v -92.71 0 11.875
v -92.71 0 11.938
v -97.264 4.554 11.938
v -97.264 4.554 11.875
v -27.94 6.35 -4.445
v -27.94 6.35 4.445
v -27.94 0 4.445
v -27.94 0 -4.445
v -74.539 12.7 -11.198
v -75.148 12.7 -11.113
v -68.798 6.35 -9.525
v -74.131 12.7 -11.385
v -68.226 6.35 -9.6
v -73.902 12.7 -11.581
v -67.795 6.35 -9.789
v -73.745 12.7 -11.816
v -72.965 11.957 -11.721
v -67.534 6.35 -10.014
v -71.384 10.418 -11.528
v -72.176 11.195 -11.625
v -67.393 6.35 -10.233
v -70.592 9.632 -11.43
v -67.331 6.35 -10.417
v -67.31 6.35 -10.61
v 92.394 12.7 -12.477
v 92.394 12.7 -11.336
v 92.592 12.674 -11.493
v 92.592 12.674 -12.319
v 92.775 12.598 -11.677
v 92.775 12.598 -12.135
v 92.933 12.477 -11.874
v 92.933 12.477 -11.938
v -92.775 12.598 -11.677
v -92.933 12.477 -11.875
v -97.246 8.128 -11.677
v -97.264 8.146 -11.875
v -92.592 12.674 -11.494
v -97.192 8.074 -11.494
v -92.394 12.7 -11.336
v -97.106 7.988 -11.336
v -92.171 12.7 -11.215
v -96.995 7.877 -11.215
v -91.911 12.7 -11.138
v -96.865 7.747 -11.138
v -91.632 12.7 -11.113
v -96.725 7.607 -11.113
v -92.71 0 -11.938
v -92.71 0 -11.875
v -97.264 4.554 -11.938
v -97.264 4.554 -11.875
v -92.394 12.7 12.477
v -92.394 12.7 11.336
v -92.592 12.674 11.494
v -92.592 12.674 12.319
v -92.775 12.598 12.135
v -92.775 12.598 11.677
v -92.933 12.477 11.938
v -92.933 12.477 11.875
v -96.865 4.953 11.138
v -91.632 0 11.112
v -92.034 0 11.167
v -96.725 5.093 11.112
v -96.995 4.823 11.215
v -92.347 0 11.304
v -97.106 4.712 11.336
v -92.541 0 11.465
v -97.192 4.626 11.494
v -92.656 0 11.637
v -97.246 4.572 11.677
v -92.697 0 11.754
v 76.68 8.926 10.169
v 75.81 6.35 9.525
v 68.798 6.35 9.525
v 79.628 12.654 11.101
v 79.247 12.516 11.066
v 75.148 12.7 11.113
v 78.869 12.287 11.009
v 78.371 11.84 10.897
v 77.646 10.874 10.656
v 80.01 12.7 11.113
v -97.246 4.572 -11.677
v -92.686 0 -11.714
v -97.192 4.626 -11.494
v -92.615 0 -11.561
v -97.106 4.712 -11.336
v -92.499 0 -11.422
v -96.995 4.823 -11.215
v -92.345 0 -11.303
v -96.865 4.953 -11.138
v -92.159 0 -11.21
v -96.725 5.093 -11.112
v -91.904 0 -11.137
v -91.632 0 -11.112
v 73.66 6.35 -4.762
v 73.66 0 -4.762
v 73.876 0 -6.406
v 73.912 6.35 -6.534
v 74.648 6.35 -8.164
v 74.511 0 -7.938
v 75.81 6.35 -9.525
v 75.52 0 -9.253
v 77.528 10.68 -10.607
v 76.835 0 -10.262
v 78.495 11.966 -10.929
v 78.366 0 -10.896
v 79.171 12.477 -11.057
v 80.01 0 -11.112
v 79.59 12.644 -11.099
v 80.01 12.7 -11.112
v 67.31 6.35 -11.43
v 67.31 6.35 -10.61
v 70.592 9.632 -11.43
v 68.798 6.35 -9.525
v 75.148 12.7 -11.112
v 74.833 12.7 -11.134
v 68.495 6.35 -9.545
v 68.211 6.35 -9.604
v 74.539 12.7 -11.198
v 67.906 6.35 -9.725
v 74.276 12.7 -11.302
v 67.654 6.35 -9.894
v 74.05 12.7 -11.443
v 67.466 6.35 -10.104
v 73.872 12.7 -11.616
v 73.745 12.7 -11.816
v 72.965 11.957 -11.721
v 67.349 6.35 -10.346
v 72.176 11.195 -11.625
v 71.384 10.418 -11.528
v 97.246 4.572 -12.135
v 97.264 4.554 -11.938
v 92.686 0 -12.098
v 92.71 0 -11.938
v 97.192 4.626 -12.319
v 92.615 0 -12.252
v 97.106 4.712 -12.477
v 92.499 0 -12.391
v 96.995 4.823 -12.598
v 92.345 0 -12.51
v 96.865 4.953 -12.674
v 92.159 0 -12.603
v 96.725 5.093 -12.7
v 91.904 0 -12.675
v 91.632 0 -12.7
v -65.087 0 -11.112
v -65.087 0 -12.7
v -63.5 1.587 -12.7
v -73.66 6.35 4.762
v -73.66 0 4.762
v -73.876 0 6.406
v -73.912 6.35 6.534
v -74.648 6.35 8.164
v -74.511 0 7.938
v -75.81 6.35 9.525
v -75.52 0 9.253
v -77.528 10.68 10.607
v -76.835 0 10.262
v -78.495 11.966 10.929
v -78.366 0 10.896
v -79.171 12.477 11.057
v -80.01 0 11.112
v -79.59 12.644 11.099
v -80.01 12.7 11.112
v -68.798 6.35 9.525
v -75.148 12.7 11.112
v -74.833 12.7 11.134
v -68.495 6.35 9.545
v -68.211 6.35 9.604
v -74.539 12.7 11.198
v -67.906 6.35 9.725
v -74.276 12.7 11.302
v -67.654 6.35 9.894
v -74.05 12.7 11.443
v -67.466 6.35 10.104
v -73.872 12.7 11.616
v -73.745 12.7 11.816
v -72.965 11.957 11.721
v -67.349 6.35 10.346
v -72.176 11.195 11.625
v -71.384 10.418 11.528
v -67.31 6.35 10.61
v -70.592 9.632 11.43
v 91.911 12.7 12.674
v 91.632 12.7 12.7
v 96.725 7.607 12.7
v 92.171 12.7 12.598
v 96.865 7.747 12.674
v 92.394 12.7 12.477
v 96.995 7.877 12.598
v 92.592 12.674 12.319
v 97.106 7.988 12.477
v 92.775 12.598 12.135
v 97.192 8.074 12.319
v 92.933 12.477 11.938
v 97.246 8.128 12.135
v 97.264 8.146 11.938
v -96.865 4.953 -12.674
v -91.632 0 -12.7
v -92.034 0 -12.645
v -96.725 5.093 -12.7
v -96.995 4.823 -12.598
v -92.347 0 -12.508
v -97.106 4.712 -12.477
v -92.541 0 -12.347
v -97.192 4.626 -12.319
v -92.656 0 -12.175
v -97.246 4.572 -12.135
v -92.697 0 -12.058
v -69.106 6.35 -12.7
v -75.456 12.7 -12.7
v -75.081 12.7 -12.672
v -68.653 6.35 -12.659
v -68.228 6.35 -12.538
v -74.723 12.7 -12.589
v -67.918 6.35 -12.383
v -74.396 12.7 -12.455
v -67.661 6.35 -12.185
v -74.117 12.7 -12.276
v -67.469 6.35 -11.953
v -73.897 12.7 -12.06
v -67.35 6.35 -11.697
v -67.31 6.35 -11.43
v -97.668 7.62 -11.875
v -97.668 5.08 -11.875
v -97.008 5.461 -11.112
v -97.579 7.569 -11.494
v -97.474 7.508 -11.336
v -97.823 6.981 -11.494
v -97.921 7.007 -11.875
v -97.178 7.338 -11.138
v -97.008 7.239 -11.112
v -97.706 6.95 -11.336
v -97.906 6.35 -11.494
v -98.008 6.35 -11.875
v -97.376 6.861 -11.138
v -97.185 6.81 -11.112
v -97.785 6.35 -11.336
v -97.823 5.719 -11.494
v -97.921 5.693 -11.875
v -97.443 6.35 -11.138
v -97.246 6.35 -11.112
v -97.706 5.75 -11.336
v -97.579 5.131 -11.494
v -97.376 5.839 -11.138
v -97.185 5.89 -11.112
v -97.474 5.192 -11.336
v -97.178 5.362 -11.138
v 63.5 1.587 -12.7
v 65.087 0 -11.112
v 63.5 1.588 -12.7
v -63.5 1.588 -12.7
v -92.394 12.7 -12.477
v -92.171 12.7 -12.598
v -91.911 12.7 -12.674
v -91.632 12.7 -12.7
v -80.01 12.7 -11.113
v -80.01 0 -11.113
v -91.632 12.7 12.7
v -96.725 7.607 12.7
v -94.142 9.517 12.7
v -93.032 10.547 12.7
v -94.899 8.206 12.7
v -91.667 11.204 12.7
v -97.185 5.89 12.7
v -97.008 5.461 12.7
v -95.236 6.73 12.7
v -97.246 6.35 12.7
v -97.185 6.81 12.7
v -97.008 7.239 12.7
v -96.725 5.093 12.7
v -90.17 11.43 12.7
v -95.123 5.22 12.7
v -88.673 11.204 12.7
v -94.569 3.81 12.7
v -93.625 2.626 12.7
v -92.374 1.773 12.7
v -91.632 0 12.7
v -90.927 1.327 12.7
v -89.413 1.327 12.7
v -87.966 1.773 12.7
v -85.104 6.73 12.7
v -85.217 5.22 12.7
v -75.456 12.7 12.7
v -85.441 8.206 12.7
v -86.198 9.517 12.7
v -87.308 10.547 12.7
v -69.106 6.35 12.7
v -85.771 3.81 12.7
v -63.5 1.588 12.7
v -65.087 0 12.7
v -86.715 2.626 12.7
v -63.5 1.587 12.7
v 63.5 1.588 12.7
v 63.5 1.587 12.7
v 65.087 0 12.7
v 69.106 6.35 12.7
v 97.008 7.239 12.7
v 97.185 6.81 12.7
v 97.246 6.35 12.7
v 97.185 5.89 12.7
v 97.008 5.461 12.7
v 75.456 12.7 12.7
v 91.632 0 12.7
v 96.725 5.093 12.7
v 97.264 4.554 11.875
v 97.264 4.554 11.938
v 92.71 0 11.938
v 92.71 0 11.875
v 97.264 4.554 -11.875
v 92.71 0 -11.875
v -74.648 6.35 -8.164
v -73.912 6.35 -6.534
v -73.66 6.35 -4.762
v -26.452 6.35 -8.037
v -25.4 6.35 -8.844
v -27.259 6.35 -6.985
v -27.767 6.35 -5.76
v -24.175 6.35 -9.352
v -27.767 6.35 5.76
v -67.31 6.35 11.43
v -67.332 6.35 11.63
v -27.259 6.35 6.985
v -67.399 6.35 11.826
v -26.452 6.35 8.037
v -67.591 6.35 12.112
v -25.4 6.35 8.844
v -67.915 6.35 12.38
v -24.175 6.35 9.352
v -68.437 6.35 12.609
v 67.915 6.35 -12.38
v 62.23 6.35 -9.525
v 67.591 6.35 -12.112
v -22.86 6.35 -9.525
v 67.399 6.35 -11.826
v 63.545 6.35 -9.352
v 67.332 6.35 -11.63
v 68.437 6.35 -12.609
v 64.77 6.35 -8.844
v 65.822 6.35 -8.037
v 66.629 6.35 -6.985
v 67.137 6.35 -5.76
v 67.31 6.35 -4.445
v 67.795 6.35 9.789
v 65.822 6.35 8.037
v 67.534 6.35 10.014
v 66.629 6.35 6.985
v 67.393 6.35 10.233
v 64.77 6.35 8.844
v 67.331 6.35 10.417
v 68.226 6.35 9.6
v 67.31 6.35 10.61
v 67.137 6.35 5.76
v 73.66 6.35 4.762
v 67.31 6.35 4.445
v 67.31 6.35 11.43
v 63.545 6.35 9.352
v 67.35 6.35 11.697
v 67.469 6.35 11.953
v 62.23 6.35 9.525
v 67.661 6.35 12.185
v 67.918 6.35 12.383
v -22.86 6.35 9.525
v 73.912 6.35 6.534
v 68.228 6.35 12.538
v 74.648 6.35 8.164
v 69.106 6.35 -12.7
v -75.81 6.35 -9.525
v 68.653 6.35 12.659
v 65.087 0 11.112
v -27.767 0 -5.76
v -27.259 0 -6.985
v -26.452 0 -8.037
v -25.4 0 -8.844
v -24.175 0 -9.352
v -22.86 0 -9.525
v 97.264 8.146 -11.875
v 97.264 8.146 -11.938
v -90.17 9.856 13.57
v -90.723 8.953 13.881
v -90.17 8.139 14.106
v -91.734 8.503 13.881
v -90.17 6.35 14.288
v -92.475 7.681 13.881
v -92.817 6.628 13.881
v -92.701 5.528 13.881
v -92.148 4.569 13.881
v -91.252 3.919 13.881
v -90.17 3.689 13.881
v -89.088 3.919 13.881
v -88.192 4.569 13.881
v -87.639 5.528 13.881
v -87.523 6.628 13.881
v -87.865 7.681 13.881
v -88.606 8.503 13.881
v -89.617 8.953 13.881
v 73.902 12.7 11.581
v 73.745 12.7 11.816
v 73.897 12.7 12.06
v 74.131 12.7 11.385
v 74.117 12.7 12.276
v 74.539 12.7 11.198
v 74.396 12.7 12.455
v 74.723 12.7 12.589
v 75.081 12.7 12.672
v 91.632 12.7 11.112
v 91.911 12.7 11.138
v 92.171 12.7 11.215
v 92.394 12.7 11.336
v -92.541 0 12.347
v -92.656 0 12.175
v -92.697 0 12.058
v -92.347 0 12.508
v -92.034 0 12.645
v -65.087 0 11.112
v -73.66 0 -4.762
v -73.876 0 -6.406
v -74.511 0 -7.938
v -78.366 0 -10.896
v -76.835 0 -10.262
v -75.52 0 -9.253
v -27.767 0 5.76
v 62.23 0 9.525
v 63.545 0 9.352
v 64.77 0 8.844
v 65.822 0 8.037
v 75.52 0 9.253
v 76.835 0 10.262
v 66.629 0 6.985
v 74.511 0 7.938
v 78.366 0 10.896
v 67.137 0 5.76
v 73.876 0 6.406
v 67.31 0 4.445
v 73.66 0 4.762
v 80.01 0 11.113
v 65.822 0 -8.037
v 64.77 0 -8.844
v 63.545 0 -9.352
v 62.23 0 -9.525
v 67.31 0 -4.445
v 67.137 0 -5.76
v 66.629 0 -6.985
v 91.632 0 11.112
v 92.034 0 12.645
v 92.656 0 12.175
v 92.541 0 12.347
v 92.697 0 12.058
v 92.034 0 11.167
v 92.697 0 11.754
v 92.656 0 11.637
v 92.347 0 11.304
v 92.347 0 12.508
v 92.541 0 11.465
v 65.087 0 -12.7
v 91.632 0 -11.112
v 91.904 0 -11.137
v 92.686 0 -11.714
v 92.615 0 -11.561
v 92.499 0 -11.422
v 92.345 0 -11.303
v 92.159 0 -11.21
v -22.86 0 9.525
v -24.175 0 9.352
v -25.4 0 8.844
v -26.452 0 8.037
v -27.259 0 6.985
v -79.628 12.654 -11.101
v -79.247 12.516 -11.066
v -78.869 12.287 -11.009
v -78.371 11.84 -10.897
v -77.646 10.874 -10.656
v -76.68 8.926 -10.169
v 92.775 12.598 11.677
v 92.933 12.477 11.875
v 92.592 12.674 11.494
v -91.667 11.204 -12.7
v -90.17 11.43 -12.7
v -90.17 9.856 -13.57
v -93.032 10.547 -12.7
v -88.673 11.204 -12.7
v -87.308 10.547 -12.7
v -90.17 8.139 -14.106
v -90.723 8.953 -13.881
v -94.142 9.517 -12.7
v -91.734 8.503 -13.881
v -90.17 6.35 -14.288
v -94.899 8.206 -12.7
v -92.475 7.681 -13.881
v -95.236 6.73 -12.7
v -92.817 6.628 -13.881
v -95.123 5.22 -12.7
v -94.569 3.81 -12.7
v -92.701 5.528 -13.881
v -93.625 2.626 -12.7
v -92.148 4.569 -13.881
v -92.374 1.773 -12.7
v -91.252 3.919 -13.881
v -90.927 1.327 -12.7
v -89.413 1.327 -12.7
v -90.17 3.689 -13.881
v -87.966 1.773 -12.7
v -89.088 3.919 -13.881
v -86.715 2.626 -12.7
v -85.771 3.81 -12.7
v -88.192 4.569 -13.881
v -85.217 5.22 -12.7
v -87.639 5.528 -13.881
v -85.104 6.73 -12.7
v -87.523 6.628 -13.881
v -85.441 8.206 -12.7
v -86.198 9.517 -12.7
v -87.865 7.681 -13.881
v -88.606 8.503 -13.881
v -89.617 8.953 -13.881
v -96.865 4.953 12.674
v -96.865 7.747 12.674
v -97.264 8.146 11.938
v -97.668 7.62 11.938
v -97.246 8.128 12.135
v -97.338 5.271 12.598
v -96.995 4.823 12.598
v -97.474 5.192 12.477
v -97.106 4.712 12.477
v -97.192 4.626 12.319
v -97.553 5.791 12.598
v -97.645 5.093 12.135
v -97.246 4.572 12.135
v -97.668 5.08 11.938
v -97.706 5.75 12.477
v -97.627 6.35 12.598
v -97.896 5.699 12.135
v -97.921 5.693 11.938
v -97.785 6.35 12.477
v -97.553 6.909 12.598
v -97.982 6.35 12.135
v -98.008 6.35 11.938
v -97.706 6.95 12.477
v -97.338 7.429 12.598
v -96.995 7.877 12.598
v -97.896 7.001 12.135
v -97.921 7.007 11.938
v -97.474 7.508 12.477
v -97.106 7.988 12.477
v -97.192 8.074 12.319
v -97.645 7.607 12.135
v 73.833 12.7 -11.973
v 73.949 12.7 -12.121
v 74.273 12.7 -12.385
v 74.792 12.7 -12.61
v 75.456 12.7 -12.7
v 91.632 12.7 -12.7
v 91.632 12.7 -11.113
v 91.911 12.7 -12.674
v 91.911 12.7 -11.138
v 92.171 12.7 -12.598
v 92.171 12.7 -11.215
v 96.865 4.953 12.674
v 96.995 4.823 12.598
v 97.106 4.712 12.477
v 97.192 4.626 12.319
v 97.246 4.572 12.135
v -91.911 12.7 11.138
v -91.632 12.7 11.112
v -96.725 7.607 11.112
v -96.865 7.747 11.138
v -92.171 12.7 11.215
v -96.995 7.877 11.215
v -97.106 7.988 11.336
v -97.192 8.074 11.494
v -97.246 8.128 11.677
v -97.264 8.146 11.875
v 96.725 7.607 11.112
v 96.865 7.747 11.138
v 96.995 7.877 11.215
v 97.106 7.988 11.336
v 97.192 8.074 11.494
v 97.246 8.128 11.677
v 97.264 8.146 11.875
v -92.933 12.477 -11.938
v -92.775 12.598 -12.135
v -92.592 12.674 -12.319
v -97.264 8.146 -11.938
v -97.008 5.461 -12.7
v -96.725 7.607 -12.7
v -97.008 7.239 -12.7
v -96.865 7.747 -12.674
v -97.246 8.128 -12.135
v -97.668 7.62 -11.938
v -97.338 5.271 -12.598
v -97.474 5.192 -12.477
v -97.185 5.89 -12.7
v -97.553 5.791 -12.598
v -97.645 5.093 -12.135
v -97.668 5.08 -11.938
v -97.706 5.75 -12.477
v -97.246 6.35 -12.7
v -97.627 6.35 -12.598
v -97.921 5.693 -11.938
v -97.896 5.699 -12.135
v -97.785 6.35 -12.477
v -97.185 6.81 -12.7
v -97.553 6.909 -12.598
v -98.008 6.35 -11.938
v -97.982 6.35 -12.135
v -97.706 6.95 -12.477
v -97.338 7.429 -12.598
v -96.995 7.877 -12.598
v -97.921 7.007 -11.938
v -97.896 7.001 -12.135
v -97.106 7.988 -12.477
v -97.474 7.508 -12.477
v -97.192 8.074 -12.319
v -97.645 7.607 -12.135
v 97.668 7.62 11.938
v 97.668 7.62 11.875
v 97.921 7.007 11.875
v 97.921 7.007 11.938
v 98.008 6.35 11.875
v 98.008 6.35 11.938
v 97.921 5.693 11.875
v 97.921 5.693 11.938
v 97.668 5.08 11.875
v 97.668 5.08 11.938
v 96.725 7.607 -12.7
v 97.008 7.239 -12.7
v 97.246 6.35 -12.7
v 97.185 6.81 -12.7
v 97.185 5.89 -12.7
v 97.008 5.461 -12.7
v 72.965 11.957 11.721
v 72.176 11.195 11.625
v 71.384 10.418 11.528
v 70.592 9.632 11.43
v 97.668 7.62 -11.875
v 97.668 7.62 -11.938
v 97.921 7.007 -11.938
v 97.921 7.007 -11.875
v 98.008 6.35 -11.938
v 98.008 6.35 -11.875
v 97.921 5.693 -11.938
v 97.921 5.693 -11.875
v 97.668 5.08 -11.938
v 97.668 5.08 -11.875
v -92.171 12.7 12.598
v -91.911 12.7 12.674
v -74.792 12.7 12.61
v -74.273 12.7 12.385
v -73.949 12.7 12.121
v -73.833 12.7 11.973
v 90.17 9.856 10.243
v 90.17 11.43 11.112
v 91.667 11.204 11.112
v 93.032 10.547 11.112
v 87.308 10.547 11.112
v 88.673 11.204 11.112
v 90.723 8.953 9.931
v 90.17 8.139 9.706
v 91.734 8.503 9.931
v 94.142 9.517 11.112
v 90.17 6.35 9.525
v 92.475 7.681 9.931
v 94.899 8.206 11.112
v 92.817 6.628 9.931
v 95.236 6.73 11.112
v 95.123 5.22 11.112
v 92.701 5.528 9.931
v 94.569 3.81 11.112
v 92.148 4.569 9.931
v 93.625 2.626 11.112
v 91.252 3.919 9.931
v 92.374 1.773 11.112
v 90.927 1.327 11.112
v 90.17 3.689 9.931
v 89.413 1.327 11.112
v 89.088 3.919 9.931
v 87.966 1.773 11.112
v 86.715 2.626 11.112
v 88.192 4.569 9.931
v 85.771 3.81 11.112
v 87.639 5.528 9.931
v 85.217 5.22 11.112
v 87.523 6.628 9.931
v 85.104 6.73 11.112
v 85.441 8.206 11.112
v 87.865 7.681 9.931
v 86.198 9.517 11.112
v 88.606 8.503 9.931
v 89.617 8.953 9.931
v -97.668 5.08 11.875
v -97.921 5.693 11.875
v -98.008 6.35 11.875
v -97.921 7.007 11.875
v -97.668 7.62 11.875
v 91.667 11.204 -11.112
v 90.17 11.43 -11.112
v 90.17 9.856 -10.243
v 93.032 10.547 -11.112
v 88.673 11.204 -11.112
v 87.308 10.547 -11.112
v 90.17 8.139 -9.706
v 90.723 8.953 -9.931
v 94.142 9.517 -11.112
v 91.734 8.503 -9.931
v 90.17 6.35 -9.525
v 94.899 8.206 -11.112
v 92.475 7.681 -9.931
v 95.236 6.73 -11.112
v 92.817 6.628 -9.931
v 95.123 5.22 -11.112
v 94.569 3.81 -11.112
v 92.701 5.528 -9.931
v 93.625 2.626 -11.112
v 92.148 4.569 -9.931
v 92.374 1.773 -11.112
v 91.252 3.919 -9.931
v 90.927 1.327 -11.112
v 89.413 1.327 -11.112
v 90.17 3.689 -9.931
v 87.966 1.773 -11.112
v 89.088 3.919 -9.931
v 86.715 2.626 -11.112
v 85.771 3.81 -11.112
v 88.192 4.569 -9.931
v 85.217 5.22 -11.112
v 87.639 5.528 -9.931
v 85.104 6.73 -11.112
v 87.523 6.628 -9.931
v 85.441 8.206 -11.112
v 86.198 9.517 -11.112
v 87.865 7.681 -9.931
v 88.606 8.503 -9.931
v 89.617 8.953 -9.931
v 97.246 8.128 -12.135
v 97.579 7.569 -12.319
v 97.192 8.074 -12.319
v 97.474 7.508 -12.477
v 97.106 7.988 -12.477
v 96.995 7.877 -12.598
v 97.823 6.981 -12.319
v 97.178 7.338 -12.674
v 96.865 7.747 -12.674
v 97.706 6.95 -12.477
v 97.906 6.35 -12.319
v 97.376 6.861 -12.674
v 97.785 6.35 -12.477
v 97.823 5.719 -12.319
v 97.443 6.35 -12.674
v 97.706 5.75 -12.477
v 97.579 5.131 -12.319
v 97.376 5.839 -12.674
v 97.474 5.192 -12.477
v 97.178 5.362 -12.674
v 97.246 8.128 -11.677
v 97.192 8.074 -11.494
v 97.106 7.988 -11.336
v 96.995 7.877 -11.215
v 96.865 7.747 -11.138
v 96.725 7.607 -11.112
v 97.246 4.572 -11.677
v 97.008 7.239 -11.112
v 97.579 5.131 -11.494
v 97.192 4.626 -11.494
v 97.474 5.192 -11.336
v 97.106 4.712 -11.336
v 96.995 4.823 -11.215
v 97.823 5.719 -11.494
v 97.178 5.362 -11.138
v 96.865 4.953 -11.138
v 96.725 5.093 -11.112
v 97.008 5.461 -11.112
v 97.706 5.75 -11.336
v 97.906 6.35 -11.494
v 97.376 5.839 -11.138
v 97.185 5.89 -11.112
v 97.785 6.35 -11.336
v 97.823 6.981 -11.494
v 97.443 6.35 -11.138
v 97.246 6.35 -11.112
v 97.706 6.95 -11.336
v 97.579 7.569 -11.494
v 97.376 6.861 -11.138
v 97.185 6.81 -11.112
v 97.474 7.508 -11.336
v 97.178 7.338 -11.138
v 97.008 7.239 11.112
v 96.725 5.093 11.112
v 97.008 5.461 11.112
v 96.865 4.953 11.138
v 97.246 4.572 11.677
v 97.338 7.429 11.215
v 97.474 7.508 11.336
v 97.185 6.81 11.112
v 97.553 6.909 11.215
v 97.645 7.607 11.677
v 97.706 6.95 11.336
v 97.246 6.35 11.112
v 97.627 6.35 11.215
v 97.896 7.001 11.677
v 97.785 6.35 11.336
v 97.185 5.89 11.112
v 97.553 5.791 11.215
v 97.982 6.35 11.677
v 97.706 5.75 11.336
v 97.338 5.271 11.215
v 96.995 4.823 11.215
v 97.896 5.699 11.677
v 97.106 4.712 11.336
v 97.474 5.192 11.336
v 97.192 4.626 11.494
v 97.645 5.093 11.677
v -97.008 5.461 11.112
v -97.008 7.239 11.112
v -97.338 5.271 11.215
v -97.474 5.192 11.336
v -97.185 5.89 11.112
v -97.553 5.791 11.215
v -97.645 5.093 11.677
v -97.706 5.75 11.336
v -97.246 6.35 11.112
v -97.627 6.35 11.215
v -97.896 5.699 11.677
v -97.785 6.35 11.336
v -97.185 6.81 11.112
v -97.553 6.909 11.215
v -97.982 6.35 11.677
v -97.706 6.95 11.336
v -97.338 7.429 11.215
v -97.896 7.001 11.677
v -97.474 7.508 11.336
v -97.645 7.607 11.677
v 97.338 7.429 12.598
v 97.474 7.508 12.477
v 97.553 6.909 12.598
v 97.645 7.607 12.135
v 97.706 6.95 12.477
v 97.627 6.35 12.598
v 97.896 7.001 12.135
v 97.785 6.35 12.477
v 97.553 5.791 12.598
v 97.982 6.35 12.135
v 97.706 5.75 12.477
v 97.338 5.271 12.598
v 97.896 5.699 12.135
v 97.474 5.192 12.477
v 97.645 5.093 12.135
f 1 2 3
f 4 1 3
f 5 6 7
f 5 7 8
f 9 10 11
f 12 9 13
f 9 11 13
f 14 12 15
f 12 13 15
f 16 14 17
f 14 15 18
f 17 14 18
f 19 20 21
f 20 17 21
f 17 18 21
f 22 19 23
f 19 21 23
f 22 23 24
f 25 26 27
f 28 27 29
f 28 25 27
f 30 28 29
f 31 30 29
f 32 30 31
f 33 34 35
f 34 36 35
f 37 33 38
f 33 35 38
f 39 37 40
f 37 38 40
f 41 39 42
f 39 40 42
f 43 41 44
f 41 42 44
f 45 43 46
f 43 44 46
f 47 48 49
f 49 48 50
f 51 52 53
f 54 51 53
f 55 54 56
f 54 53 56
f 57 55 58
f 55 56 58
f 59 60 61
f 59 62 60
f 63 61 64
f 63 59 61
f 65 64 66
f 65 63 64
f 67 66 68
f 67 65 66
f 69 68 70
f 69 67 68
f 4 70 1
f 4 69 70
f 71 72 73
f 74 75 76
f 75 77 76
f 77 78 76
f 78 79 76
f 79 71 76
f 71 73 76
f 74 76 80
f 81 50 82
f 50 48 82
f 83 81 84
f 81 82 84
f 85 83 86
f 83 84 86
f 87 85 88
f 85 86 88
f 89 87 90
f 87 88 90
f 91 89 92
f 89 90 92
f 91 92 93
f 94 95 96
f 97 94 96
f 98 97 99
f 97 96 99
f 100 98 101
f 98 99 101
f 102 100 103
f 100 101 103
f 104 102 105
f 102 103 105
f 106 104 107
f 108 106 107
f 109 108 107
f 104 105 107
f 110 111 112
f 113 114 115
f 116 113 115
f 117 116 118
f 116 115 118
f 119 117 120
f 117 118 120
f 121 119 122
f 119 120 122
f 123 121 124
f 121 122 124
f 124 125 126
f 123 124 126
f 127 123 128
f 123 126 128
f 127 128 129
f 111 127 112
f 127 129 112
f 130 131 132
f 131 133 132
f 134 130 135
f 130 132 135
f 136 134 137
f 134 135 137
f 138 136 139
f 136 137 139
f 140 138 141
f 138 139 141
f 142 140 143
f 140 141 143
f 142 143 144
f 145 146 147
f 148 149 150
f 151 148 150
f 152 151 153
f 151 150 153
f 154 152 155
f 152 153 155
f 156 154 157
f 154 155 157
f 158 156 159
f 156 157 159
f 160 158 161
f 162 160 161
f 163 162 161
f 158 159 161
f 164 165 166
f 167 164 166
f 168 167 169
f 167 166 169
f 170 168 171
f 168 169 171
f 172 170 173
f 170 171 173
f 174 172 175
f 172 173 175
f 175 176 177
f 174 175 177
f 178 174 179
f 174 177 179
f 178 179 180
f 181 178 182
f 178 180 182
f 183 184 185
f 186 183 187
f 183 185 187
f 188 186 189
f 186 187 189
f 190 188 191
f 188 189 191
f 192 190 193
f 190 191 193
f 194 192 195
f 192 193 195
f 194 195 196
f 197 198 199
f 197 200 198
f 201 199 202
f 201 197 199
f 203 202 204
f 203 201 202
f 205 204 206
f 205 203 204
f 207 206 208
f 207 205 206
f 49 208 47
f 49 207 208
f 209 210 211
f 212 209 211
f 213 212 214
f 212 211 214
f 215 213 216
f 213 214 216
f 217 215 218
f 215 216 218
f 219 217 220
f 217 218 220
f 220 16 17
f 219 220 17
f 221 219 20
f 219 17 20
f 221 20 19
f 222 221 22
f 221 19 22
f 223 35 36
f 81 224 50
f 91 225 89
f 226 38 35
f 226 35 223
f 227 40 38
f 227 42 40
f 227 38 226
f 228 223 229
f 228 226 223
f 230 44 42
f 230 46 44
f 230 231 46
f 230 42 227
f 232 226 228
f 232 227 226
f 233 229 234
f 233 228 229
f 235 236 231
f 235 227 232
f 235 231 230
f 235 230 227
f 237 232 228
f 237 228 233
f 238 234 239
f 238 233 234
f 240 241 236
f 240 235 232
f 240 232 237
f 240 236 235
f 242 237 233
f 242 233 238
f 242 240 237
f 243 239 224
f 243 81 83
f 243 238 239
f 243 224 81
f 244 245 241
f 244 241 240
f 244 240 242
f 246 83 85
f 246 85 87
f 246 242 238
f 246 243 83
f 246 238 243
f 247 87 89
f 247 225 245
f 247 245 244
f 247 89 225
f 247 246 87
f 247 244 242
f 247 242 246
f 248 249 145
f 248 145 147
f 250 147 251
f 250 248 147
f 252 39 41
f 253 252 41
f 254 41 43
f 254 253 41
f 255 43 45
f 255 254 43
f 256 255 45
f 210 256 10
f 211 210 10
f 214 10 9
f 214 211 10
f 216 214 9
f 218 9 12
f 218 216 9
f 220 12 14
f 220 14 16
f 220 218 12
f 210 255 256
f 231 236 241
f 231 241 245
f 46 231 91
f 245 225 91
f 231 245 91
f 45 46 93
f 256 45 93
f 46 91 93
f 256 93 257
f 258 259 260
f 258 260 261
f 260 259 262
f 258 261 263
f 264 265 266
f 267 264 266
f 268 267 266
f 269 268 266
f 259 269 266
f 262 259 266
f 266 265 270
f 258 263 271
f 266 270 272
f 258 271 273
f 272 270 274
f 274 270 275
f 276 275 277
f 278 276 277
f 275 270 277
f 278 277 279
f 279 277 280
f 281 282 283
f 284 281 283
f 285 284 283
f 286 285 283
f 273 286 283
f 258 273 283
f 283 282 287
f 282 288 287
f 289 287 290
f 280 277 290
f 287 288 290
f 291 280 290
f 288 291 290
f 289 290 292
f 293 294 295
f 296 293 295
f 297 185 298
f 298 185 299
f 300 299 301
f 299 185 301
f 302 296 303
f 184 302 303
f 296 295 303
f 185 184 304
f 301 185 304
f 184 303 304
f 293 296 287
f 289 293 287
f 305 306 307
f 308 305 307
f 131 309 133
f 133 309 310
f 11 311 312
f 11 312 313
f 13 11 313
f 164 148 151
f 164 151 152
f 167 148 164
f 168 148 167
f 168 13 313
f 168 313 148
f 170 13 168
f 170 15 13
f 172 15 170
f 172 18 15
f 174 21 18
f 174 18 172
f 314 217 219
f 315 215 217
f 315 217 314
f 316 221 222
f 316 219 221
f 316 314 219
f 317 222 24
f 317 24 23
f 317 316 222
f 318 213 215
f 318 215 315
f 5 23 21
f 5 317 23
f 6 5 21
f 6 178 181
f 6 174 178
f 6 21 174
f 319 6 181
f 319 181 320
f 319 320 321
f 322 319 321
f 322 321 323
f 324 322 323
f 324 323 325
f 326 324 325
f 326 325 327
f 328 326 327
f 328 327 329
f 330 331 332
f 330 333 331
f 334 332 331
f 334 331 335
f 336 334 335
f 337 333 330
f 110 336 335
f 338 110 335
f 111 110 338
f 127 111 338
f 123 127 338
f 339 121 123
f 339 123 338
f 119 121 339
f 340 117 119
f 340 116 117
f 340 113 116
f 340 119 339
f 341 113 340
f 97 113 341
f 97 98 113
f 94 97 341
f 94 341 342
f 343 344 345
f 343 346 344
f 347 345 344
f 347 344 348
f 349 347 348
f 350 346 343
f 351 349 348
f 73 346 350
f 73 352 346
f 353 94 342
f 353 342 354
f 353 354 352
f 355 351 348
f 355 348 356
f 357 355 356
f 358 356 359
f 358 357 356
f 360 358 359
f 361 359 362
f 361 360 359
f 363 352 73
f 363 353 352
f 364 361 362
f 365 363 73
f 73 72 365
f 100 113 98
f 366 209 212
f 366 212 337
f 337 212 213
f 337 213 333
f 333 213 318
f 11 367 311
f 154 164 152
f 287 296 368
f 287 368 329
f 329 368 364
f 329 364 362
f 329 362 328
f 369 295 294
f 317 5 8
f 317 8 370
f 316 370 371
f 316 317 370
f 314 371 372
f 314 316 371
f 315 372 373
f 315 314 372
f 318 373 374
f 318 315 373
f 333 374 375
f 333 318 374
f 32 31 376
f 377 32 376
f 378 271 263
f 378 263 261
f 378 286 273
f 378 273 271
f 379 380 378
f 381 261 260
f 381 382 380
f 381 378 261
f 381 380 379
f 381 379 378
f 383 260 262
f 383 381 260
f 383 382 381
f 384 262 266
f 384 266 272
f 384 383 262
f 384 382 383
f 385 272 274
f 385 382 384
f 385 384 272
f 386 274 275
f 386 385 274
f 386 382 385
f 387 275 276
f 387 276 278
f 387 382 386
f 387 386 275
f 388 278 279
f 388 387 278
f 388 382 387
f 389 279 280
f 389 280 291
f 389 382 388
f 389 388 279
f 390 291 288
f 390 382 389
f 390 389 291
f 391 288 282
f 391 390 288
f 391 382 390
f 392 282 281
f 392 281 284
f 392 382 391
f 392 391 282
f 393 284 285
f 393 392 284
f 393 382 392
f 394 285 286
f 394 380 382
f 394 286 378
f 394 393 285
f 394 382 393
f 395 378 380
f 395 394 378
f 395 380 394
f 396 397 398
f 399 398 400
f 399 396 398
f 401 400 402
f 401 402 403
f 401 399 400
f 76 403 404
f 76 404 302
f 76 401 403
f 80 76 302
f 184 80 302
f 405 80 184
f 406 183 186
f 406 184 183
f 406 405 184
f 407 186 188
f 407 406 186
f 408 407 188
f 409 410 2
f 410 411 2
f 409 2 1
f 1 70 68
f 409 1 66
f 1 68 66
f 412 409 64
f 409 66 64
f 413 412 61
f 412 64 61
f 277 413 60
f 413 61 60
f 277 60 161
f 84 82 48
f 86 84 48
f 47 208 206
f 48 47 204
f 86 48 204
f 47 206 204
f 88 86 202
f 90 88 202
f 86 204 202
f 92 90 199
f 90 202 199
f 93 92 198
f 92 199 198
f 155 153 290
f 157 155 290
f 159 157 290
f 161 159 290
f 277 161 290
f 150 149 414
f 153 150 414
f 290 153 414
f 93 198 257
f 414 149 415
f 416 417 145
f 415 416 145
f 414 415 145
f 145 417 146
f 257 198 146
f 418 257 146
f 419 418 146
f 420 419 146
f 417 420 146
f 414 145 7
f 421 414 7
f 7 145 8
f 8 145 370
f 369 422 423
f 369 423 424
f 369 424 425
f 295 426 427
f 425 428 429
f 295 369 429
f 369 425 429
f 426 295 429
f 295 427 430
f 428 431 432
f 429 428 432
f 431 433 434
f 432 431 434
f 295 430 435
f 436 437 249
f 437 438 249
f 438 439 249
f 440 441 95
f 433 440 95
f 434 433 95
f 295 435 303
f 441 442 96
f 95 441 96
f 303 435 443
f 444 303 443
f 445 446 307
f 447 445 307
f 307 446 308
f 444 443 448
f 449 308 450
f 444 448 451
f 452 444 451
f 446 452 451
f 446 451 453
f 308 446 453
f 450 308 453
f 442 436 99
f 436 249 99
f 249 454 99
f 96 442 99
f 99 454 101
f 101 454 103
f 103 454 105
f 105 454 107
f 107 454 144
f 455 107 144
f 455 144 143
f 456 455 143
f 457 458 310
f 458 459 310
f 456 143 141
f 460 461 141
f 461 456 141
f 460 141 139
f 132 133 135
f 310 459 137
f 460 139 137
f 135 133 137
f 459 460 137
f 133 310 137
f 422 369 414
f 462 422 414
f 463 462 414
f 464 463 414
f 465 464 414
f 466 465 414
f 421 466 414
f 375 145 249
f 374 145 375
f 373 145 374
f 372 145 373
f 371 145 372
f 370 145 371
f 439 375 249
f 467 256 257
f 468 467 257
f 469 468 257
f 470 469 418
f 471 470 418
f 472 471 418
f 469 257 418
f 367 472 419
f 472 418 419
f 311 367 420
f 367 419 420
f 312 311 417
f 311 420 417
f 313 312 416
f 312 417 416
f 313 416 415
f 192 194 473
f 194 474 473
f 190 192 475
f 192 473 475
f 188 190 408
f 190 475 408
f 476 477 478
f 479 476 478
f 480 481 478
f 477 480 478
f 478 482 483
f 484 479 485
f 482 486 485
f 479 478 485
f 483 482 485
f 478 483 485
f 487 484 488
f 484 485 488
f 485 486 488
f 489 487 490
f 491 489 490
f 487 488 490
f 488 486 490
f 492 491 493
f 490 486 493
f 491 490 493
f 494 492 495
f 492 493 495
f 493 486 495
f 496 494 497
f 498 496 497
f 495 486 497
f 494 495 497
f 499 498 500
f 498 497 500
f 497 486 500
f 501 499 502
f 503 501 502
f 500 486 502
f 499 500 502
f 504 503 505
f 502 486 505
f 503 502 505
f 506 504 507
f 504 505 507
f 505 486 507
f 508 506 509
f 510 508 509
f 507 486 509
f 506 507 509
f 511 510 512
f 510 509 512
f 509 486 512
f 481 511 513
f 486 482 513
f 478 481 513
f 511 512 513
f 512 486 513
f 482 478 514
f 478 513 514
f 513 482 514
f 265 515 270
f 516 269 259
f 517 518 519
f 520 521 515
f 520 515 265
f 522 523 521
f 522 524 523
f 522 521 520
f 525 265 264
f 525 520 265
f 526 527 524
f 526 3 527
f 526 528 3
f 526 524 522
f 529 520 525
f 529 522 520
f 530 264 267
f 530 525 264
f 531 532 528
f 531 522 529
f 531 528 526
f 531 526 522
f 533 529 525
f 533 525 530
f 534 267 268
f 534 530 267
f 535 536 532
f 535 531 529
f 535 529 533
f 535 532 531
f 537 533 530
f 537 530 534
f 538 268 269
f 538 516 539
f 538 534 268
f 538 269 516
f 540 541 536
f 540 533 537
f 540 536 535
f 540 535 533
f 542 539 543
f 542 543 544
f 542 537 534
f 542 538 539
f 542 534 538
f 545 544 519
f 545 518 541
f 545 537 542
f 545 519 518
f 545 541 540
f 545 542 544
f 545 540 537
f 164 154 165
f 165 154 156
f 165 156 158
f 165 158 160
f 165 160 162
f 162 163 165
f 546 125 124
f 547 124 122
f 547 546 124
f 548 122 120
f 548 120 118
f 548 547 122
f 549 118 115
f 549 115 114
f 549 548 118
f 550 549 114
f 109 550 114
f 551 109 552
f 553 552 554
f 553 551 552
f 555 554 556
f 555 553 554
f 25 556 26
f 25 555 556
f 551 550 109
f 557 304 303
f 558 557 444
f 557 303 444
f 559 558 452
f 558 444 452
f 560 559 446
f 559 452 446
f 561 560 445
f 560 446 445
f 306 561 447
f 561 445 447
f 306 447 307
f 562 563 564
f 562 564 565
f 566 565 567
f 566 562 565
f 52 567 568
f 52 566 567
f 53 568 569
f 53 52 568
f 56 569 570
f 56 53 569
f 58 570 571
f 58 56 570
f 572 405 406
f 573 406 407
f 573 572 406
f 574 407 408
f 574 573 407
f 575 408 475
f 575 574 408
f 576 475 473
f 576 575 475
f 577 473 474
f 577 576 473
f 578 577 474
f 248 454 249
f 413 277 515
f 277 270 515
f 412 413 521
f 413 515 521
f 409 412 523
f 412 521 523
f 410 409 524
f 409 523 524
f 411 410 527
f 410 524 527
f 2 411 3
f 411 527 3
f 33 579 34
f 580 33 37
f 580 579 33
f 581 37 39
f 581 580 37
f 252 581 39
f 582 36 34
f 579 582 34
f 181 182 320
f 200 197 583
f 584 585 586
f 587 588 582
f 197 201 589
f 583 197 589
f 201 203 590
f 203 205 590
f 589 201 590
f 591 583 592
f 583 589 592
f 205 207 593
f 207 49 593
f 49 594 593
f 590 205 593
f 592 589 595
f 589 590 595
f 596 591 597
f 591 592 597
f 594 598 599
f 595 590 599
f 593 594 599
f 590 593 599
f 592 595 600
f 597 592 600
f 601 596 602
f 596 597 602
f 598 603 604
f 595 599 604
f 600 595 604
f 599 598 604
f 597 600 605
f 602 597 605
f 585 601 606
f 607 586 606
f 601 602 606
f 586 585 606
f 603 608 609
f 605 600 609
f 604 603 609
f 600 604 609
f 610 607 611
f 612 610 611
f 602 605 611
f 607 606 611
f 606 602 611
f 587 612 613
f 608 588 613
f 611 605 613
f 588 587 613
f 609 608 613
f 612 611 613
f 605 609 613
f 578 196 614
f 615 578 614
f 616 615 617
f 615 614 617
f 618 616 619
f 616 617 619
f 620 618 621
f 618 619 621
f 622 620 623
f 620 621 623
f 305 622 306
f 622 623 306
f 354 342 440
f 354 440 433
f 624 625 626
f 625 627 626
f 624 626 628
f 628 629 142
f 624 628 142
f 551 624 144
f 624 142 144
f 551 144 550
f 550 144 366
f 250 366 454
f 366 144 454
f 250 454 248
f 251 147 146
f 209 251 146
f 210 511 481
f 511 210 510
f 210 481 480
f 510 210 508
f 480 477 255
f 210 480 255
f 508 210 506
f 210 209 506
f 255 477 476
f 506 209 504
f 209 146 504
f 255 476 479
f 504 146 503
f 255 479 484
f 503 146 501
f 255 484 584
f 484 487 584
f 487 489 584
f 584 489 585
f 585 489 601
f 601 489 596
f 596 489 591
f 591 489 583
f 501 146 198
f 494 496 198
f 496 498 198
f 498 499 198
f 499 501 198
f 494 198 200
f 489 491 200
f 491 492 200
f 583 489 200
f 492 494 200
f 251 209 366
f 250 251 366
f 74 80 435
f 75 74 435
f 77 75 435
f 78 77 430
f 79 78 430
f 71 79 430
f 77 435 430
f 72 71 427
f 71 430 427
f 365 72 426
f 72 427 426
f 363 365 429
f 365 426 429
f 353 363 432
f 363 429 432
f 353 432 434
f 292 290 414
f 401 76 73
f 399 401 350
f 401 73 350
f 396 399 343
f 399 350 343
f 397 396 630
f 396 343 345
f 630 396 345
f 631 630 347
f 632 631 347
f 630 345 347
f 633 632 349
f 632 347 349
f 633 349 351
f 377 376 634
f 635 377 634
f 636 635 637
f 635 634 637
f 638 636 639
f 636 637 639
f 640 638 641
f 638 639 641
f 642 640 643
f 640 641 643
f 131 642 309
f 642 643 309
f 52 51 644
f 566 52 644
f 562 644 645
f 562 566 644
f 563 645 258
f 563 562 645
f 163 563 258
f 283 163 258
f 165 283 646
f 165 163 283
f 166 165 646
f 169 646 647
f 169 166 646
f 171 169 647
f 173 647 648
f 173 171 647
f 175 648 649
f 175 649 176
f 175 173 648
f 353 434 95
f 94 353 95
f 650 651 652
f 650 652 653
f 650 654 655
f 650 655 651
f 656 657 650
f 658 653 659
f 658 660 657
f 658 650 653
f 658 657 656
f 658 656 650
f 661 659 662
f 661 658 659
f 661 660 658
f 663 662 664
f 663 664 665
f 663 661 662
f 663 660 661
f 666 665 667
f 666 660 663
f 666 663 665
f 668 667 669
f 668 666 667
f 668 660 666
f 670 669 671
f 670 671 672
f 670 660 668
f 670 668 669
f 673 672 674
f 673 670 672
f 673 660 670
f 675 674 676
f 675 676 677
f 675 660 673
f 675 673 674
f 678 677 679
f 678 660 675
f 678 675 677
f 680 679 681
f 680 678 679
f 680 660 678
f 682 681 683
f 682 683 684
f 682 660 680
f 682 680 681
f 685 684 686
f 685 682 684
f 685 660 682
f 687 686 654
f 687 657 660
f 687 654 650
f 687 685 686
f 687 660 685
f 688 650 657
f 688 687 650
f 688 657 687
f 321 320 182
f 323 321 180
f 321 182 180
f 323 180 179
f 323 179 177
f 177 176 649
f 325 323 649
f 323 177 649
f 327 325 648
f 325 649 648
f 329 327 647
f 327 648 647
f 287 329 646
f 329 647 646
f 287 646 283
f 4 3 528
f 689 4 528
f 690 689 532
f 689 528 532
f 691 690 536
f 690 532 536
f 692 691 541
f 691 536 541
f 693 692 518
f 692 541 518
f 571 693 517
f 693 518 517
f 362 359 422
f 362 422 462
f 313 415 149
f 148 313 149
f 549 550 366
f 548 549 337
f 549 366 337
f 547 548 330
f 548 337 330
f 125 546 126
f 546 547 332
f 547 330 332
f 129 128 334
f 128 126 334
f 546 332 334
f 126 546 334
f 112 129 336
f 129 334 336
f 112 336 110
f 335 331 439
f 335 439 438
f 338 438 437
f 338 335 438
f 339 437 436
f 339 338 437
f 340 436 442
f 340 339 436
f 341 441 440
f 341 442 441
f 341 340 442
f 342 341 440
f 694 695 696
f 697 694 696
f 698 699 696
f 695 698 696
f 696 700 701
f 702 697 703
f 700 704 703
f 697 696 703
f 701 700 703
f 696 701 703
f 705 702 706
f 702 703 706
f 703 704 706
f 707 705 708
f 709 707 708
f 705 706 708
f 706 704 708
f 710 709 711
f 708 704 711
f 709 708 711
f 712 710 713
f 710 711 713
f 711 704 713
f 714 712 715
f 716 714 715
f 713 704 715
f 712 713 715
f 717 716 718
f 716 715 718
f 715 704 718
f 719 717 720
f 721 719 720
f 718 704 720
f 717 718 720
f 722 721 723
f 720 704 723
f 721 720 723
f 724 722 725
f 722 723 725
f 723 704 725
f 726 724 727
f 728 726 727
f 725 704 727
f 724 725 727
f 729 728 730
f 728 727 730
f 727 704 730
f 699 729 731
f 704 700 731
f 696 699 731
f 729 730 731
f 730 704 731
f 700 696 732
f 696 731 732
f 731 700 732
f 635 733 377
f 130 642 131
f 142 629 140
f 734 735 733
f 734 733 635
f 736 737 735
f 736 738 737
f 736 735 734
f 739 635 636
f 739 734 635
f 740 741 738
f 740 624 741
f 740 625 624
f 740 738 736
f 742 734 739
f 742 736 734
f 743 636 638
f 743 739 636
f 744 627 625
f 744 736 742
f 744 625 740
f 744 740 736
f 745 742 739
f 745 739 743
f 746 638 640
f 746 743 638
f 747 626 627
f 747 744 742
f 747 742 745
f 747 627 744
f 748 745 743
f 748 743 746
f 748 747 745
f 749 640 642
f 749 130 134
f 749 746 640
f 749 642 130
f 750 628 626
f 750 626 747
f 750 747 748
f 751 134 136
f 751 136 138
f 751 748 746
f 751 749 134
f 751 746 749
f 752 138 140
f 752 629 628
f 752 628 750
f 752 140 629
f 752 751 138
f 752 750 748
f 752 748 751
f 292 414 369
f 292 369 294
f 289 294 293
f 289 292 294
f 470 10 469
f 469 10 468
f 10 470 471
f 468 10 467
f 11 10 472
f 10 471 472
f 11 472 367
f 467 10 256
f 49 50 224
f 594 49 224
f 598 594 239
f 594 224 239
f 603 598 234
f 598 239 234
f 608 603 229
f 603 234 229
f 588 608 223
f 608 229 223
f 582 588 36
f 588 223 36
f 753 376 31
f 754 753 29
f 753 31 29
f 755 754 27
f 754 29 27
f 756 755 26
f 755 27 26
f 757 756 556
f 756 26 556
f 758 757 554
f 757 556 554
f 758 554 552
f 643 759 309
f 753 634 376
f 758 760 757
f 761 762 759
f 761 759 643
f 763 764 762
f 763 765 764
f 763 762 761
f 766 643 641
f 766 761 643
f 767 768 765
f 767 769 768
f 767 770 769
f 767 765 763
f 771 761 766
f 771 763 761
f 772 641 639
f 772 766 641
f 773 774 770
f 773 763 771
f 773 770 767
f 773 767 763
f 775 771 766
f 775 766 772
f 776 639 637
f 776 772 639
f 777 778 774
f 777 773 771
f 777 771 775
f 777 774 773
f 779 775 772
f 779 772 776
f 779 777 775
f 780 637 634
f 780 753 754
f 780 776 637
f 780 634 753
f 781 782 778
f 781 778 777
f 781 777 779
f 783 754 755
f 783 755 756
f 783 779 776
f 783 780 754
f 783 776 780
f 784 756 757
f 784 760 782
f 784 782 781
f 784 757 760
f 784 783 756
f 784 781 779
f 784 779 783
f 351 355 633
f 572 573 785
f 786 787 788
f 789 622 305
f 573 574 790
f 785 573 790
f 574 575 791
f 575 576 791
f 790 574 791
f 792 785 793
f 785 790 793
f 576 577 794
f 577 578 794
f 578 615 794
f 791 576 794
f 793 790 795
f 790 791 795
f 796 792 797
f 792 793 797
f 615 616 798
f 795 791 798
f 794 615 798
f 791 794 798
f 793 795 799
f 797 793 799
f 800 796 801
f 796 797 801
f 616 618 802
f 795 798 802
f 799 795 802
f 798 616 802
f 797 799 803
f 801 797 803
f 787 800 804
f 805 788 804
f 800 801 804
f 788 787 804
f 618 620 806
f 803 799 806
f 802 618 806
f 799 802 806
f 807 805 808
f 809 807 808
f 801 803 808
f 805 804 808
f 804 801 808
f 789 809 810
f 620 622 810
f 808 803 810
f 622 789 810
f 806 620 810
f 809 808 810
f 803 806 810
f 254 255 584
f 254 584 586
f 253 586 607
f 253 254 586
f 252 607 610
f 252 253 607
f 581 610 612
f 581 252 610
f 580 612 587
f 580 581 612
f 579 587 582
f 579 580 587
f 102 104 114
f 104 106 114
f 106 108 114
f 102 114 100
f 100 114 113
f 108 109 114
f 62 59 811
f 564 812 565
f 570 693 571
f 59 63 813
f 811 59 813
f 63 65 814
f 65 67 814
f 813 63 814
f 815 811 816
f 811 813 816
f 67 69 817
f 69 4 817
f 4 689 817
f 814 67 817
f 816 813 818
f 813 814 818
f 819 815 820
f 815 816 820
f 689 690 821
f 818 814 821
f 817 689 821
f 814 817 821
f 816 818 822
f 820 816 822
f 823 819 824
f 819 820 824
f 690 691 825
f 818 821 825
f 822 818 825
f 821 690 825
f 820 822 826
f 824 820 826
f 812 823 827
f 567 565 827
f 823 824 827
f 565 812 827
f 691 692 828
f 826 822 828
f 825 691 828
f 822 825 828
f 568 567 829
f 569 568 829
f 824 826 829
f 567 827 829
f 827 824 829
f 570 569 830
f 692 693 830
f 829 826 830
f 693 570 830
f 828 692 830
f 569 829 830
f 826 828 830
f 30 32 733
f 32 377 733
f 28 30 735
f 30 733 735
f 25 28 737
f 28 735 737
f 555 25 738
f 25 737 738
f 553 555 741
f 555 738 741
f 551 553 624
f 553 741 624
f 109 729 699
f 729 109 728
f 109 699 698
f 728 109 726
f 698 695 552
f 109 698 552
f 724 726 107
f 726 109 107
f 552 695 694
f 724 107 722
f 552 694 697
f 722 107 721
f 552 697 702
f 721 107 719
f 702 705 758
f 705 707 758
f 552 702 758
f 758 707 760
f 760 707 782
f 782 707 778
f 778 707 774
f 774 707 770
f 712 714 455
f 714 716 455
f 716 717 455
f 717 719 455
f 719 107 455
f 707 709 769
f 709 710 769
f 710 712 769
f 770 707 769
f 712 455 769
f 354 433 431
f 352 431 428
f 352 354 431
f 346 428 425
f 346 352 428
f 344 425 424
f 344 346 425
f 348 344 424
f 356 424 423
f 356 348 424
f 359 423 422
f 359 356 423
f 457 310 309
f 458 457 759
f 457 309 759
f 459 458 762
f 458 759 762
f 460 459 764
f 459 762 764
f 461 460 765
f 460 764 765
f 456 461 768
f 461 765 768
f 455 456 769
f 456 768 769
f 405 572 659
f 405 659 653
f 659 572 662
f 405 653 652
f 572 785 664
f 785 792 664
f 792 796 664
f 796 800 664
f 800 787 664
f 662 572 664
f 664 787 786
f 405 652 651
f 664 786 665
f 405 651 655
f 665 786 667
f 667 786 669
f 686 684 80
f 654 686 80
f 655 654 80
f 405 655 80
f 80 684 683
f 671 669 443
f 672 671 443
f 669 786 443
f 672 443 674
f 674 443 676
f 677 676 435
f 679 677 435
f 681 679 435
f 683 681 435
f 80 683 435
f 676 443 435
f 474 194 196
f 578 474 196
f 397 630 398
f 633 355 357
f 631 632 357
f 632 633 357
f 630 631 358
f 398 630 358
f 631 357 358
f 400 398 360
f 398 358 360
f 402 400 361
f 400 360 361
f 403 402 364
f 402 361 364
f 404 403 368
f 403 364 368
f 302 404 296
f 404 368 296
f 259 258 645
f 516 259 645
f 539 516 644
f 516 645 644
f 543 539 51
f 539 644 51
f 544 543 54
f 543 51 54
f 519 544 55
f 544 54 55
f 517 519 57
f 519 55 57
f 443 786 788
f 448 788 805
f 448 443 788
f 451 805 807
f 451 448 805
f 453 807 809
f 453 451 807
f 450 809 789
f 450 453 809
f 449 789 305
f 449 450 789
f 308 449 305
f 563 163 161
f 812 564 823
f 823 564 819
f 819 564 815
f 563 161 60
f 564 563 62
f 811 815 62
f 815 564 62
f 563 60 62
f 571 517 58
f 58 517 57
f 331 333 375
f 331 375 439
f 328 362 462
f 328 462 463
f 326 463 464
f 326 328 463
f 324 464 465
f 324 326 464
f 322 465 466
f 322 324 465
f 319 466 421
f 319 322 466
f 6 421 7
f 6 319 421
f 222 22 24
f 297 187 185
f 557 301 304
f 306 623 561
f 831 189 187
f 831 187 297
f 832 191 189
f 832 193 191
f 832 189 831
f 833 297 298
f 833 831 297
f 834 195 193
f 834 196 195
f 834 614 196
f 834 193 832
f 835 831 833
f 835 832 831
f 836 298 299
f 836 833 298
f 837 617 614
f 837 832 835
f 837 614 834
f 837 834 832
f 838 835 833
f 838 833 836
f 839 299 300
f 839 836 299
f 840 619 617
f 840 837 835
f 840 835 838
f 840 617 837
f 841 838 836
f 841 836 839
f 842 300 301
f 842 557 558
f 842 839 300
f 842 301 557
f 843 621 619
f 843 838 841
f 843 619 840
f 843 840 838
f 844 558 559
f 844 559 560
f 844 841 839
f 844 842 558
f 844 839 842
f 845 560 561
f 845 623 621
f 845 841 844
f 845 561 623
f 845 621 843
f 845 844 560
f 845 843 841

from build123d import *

# Parameters (mm, degrees)
BOSS_EXTRUDE1_DEPTH = 12.7
CUT_EXTRUDE2_DEPTH  = 199.932436772
CUT_EXTRUDE1_DEPTH  = 104.050150898
CUT_EXTRUDE3_DEPTH  = 63.5
CHAMFER1_SIZE       = 1.5875
FILLET1_R           = 0.762
FILLET2_R           = 1.27
CUT_EXTRUDE4_DEPTH  = 100.247182118


# Some blends are built 0.0001 mm under size
with BuildPart() as part:
    # Sketch1 → Boss-Extrude1 (new body)
    with BuildSketch(Plane(origin=(0, 0, 0), x_dir=(1, 0, 0), z_dir=(0, 1, 0))):
        with BuildLine():
            Line((-99.06, -12.7), (99.06, -12.7))
            Line((99.06, -12.7), (99.06, -11.1125))
            Line((99.06, -11.1125), (80.01, -11.1125))
            ThreePointArc((80.01, -11.1125), (75.519871939, -9.252628061), (73.66, -4.7625))
            Line((73.66, -4.7625), (73.66, 4.7625))
            ThreePointArc((73.66, 4.7625), (75.519871939, 9.252628061), (80.01, 11.1125))
            Line((80.01, 11.1125), (99.06, 11.1125))
            Line((99.06, 11.1125), (99.06, 12.7))
            Line((99.06, 12.7), (-99.06, 12.7))
            Line((-99.06, 12.7), (-99.06, 11.1125))
            Line((-99.06, 11.1125), (-80.01, 11.1125))
            ThreePointArc((-80.01, 11.1125), (-75.519871939, 9.252628061), (-73.66, 4.7625))
            Line((-73.66, 4.7625), (-73.66, -4.7625))
            ThreePointArc((-73.66, -4.7625), (-75.519871939, -9.252628061), (-80.01, -11.1125))
            Line((-80.01, -11.1125), (-99.06, -11.1125))
            Line((-99.06, -11.1125), (-99.06, -12.7))
        make_face()
    extrude(amount=BOSS_EXTRUDE1_DEPTH)

    # Sketch3 → Cut-Extrude2 (cut, through all)
    with BuildSketch(Plane.ZY.offset(99.06)):
        Polygon((11.1125, 12.7), (4.7625, 12.7), (-4.7625, 12.7), (-11.1125, 12.7), (-9.525, 6.35), (9.525, 6.35), align=None)
    extrude(amount=-CUT_EXTRUDE2_DEPTH, mode=Mode.SUBTRACT)

    # Sketch2 → Cut-Extrude1 (cut, through all)
    with BuildSketch(Plane.XY.offset(12.7)):
        Polygon((73.66, 12.7), (-73.66, 12.7), (-67.31, 6.35), (67.31, 6.35), align=None)
        with BuildLine():
            Line((97.263948776, 4.553948776), (92.71, 0))
            Line((92.71, 0), (99.06, 0))
            Line((99.06, 0), (99.06, 12.7))
            Line((99.06, 12.7), (92.71, 12.7))
            Line((92.71, 12.7), (97.263948776, 8.146051224))
            ThreePointArc((97.263948776, 8.146051224), (98.007897552, 6.35), (97.263948776, 4.553948776))
        make_face()
        with BuildLine():
            ThreePointArc((-97.263948776, 4.553948776), (-98.007897552, 6.35), (-97.263948776, 8.146051224))
            Line((-97.263948776, 8.146051224), (-92.71, 12.7))
            Line((-92.71, 12.7), (-99.06, 12.7))
            Line((-99.06, 12.7), (-99.06, 0))
            Line((-99.06, 0), (-92.71, 0))
            Line((-92.71, 0), (-97.263948776, 4.553948776))
        make_face()
    extrude(amount=-CUT_EXTRUDE1_DEPTH, mode=Mode.SUBTRACT)

    # Sketch4 → Revolve1 (revolve)
    with BuildSketch(Plane.ZY.offset(90.17)):
        with BuildLine():
            Line((12.7, 6.35), (12.7, 11.43))
            ThreePointArc((12.7, 11.43), (13.881381744, 9.01113492), (14.2875, 6.35))
            Line((14.2875, 6.35), (12.7, 6.35))
        make_face()
    revolve1 = revolve(axis=Axis((-90.17, 6.35, 0), (0, 0, 1)))

    # Mirror1: Revolve1 across plane
    add(revolve1.mirror(Plane.XY))

    # Sketch5 → Revolve2 (revolve)
    with BuildSketch(Plane(origin=(90.17, 0, 0), x_dir=(0, 0, -1), z_dir=(1, 0, 0))):
        with BuildLine():
            Line((11.1125, 6.35), (11.1125, 11.43))
            ThreePointArc((11.1125, 11.43), (9.931118256, 9.01113492), (9.525, 6.35))
            Line((9.525, 6.35), (11.1125, 6.35))
        make_face()
    revolve2 = revolve(axis=Axis((90.17, 6.35, 0), (0, 0, -1)))

    # Mirror2: Revolve2 across plane
    add(revolve2.mirror(Plane.XY))

    # Sketch6 → Cut-Extrude3 (cut, symmetric)
    with BuildSketch(Plane(origin=(0, 0, 0), x_dir=(0, 0, -1), z_dir=(1, 0, 0))):
        Polygon((-12.7, 0), (-11.1125, 0), (-12.7, 1.5875), align=None)
        Polygon((11.1125, 0), (12.7, 1.5875), (12.7, 0), align=None)
    extrude(amount=CUT_EXTRUDE3_DEPTH, both=True, mode=Mode.SUBTRACT)

    # Chamfer1
    chamfer1_edges = [part.edges().sort_by_distance(p)[0] for p in [
        (63.5, 0, 11.90625),
        (63.5, 0, -11.90625),
        (-63.5, 0, -11.90625),
        (-63.5, 0, 11.90625),
    ]]
    chamfer(chamfer1_edges, length=CHAMFER1_SIZE - 0.0001)  # a hair under: the kernel refuses the full size

    # Fillet1
    fillet1_edges = [part.edges().sort_by_distance(p)[0] for p in [
        (-98.007897552, 6.35, 12.7),
        (-92.71, 12.7, -11.90625),
        (-94.986974388, 10.423025612, -11.1125),
        (-94.986974388, 10.423025612, -12.7),
        (-94.986974388, 10.423025612, 11.1125),
        (-92.71, 12.7, 11.90625),
        (-94.986974388, 2.276974388, 12.7),
        (-98.007897552, 6.35, -11.1125),
        (-98.007897552, 6.35, 11.1125),
        (-94.986974388, 2.276974388, -11.1125),
        (-94.986974388, 2.276974388, 11.1125),
        (-98.007897552, 6.35, -12.7),
        (-94.986974388, 2.276974388, -12.7),
        (-94.986974388, 10.423025612, 12.7),
        (98.007897552, 6.35, 12.7),
        (92.71, 12.7, 11.90625),
        (92.71, 12.7, -11.90625),
        (94.986974388, 10.423025612, 12.7),
        (94.986974388, 2.276974388, 11.1125),
        (94.986974388, 2.276974388, -11.1125),
        (94.986974388, 2.276974388, -12.7),
        (98.007897552, 6.35, 11.1125),
        (94.986974388, 10.423025612, 11.1125),
        (94.986974388, 10.423025612, -11.1125),
        (98.007897552, 6.35, -12.7),
        (94.986974388, 10.423025612, -12.7),
        (94.986974388, 2.276974388, 12.7),
        (98.007897552, 6.35, -11.1125),
    ]]
    fillet(fillet1_edges, radius=FILLET1_R)

    # Fillet2
    # the kernel refuses this fillet: 1.27 mm, written as the material it takes off along each edge
    with BuildSketch(Plane(origin=(-75.90506403, 14.94506403, -12.7), x_dir=(-0.7071067811865446, -0.7071067811865505, 0), z_dir=(0.7071067811865506, -0.7071067811865446, 0))) as fillet2_piece_1_section:
        with BuildLine():
            CenterArc((FILLET2_R, -FILLET2_R), FILLET2_R, 90, 90)
            Line((0, -FILLET2_R), (0, 0))
            Line((0, 0), (FILLET2_R, 0))
        make_face()
    fillet2_piece_1 = extrude(amount=15.330256121, mode=Mode.PRIVATE)
    fillet2_piece_1 = split(fillet2_piece_1, bisect_by=Plane(origin=(-71.905795305, 6.35, -12.408746665), z_dir=(0, 1, 0)), keep=Keep.TOP, mode=Mode.PRIVATE)
    add(fillet2_piece_1, mode=Mode.SUBTRACT)
    with BuildSketch(Plane(origin=(-65.450815483, 4.490815483, -9.060203871), x_dir=(0.1230914909792504, -0.12309149097924957, -0.9847319278346824), z_dir=(-0.696310623822809, 0.6963106238228031, -0.17407765595558086))) as fillet2_piece_2_section:
        with BuildLine():
            CenterArc((FILLET2_R * 0.840960781889, FILLET2_R), FILLET2_R, 189.874961398, 80.125038602)
            Line((-FILLET2_R * 0.144223584254, FILLET2_R * 0.828501414858), (0, 0))
            Line((0, 0), (FILLET2_R * 0.840960781889, 0))
        make_face()
    fillet2_piece_2 = extrude(amount=14.459594166, mode=Mode.PRIVATE)
    fillet2_piece_2 = split(fillet2_piece_2, bisect_by=Plane(origin=(-71.646234354, 6.35, -10.770930609), z_dir=(0, 1, 0)), keep=Keep.TOP, mode=Mode.PRIVATE)
    add(fillet2_piece_2, mode=Mode.SUBTRACT)
    with BuildSketch(Plane(origin=(-75.519184517, 14.559184517, 11.577296129), x_dir=(-0.7177405625652845, -0.6755205294731655, -0.1688801323683837), z_dir=(0.69631062382278, -0.6963106238227741, -0.17407765595581334))) as fillet2_piece_3_section:
        with BuildLine():
            CenterArc((FILLET2_R * 0.840960781889, -FILLET2_R), FILLET2_R, 90, 80.125038602)
            Line((-FILLET2_R * 0.144223584254, -FILLET2_R * 0.828501414857), (0, 0))
            Line((0, 0), (FILLET2_R * 0.840960781889, 0))
        make_face()
    fillet2_piece_3 = extrude(amount=14.459594166, mode=Mode.PRIVATE)
    fillet2_piece_3 = split(fillet2_piece_3, bisect_by=Plane(origin=(-71.646234354, 6.35, 10.770930609), z_dir=(0, 1, 0)), keep=Keep.TOP, mode=Mode.PRIVATE)
    add(fillet2_piece_3, mode=Mode.SUBTRACT)
    with BuildSketch(Plane(origin=(-75.90506403, 14.94506403, 12.7), x_dir=(-0.7071067811865445, -0.7071067811865505, 0), z_dir=(0.7071067811865506, -0.7071067811865446, 0))) as fillet2_piece_4_section:
        with BuildLine():
            CenterArc((FILLET2_R, FILLET2_R), FILLET2_R, 180, 90)
            Line((0, FILLET2_R), (0, 0))
            Line((0, 0), (FILLET2_R, 0))
        make_face()
    fillet2_piece_4 = extrude(amount=15.330256121, mode=Mode.PRIVATE)
    fillet2_piece_4 = split(fillet2_piece_4, bisect_by=Plane(origin=(-71.905795305, 6.35, 12.408746665), z_dir=(0, 1, 0)), keep=Keep.TOP, mode=Mode.PRIVATE)
    add(fillet2_piece_4, mode=Mode.SUBTRACT)
    with BuildSketch(Plane(origin=(65.06493597, 4.10493597, -12.7), x_dir=(0.7071067811865445, -0.7071067811865506, 0), z_dir=(0.7071067811865506, 0.7071067811865445, 0))) as fillet2_piece_5_section:
        with BuildLine():
            CenterArc((FILLET2_R, -FILLET2_R), FILLET2_R, 90, 90)
            Line((0, -FILLET2_R), (0, 0))
            Line((0, 0), (FILLET2_R, 0))
        make_face()
    fillet2_piece_5 = extrude(amount=15.330256121, mode=Mode.PRIVATE)
    fillet2_piece_5 = split(fillet2_piece_5, bisect_by=Plane(origin=(71.905795305, 6.35, -12.408746665), z_dir=(0, 1, 0)), keep=Keep.TOP, mode=Mode.PRIVATE)
    add(fillet2_piece_5, mode=Mode.SUBTRACT)
    with BuildSketch(Plane(origin=(75.519184517, 14.559184517, -11.577296129), x_dir=(-0.12309149097927001, -0.12309149097926336, -0.9847319278346782), z_dir=(-0.6963106238228061, -0.6963106238228001, 0.17407765595560445))) as fillet2_piece_6_section:
        with BuildLine():
            CenterArc((FILLET2_R * 0.840960781889, FILLET2_R), FILLET2_R, 189.874961398, 80.125038602)
            Line((-FILLET2_R * 0.144223584254, FILLET2_R * 0.828501414858), (0, 0))
            Line((0, 0), (FILLET2_R * 0.84096078189, 0))
        make_face()
    fillet2_piece_6 = extrude(amount=14.459594166, mode=Mode.PRIVATE)
    fillet2_piece_6 = split(fillet2_piece_6, bisect_by=Plane(origin=(71.646234354, 6.35, -10.770930609), z_dir=(0, 1, 0)), keep=Keep.TOP, mode=Mode.PRIVATE)
    add(fillet2_piece_6, mode=Mode.SUBTRACT)
    with BuildSketch(Plane(origin=(65.06493597, 4.10493597, 12.7), x_dir=(0.7071067811865445, -0.7071067811865507, 0), z_dir=(0.7071067811865506, 0.7071067811865445, 0))) as fillet2_piece_7_section:
        with BuildLine():
            CenterArc((FILLET2_R, FILLET2_R), FILLET2_R, 180, 90)
            Line((0, FILLET2_R), (0, 0))
            Line((0, 0), (FILLET2_R, 0))
        make_face()
    fillet2_piece_7 = extrude(amount=15.330256121, mode=Mode.PRIVATE)
    fillet2_piece_7 = split(fillet2_piece_7, bisect_by=Plane(origin=(71.905795305, 6.35, 12.408746665), z_dir=(0, 1, 0)), keep=Keep.TOP, mode=Mode.PRIVATE)
    add(fillet2_piece_7, mode=Mode.SUBTRACT)
    with BuildSketch(Plane(origin=(65.450815483, 4.490815483, 9.060203871), x_dir=(0.7177405625652817, -0.6755205294731627, -0.16888013236840813), z_dir=(0.6963106238227829, 0.6963106238227769, 0.1740776559557897))) as fillet2_piece_8_section:
        with BuildLine():
            CenterArc((FILLET2_R * 0.840960781889, -FILLET2_R), FILLET2_R, 90, 80.125038602)
            Line((-FILLET2_R * 0.144223584254, -FILLET2_R * 0.828501414857), (0, 0))
            Line((0, 0), (FILLET2_R * 0.840960781889, 0))
        make_face()
    fillet2_piece_8 = extrude(amount=14.459594166, mode=Mode.PRIVATE)
    fillet2_piece_8 = split(fillet2_piece_8, bisect_by=Plane(origin=(71.646234354, 6.35, 10.770930609), z_dir=(0, 1, 0)), keep=Keep.TOP, mode=Mode.PRIVATE)
    add(fillet2_piece_8, mode=Mode.SUBTRACT)

    # Sketch7 → Cut-Extrude4 (cut, through all)
    with BuildSketch(Plane(origin=(0, 6.35, 0), x_dir=(1, 0, 0), z_dir=(0, 1, 0))):
        with BuildLine():
            Line((-22.86, 9.525), (62.23, 9.525))
            ThreePointArc((62.23, 9.525), (65.822102448, 8.037102448), (67.31, 4.445))
            Line((67.31, 4.445), (67.31, -4.445))
            ThreePointArc((67.31, -4.445), (65.822102448, -8.037102448), (62.23, -9.525))
            Line((62.23, -9.525), (-22.86, -9.525))
            ThreePointArc((-22.86, -9.525), (-26.452102448, -8.037102448), (-27.94, -4.445))
            Line((-27.94, -4.445), (-27.94, 4.445))
            ThreePointArc((-27.94, 4.445), (-26.452102448, 8.037102448), (-22.86, 9.525))
        make_face()
    extrude(amount=-CUT_EXTRUDE4_DEPTH, mode=Mode.SUBTRACT)


solid = part.part
